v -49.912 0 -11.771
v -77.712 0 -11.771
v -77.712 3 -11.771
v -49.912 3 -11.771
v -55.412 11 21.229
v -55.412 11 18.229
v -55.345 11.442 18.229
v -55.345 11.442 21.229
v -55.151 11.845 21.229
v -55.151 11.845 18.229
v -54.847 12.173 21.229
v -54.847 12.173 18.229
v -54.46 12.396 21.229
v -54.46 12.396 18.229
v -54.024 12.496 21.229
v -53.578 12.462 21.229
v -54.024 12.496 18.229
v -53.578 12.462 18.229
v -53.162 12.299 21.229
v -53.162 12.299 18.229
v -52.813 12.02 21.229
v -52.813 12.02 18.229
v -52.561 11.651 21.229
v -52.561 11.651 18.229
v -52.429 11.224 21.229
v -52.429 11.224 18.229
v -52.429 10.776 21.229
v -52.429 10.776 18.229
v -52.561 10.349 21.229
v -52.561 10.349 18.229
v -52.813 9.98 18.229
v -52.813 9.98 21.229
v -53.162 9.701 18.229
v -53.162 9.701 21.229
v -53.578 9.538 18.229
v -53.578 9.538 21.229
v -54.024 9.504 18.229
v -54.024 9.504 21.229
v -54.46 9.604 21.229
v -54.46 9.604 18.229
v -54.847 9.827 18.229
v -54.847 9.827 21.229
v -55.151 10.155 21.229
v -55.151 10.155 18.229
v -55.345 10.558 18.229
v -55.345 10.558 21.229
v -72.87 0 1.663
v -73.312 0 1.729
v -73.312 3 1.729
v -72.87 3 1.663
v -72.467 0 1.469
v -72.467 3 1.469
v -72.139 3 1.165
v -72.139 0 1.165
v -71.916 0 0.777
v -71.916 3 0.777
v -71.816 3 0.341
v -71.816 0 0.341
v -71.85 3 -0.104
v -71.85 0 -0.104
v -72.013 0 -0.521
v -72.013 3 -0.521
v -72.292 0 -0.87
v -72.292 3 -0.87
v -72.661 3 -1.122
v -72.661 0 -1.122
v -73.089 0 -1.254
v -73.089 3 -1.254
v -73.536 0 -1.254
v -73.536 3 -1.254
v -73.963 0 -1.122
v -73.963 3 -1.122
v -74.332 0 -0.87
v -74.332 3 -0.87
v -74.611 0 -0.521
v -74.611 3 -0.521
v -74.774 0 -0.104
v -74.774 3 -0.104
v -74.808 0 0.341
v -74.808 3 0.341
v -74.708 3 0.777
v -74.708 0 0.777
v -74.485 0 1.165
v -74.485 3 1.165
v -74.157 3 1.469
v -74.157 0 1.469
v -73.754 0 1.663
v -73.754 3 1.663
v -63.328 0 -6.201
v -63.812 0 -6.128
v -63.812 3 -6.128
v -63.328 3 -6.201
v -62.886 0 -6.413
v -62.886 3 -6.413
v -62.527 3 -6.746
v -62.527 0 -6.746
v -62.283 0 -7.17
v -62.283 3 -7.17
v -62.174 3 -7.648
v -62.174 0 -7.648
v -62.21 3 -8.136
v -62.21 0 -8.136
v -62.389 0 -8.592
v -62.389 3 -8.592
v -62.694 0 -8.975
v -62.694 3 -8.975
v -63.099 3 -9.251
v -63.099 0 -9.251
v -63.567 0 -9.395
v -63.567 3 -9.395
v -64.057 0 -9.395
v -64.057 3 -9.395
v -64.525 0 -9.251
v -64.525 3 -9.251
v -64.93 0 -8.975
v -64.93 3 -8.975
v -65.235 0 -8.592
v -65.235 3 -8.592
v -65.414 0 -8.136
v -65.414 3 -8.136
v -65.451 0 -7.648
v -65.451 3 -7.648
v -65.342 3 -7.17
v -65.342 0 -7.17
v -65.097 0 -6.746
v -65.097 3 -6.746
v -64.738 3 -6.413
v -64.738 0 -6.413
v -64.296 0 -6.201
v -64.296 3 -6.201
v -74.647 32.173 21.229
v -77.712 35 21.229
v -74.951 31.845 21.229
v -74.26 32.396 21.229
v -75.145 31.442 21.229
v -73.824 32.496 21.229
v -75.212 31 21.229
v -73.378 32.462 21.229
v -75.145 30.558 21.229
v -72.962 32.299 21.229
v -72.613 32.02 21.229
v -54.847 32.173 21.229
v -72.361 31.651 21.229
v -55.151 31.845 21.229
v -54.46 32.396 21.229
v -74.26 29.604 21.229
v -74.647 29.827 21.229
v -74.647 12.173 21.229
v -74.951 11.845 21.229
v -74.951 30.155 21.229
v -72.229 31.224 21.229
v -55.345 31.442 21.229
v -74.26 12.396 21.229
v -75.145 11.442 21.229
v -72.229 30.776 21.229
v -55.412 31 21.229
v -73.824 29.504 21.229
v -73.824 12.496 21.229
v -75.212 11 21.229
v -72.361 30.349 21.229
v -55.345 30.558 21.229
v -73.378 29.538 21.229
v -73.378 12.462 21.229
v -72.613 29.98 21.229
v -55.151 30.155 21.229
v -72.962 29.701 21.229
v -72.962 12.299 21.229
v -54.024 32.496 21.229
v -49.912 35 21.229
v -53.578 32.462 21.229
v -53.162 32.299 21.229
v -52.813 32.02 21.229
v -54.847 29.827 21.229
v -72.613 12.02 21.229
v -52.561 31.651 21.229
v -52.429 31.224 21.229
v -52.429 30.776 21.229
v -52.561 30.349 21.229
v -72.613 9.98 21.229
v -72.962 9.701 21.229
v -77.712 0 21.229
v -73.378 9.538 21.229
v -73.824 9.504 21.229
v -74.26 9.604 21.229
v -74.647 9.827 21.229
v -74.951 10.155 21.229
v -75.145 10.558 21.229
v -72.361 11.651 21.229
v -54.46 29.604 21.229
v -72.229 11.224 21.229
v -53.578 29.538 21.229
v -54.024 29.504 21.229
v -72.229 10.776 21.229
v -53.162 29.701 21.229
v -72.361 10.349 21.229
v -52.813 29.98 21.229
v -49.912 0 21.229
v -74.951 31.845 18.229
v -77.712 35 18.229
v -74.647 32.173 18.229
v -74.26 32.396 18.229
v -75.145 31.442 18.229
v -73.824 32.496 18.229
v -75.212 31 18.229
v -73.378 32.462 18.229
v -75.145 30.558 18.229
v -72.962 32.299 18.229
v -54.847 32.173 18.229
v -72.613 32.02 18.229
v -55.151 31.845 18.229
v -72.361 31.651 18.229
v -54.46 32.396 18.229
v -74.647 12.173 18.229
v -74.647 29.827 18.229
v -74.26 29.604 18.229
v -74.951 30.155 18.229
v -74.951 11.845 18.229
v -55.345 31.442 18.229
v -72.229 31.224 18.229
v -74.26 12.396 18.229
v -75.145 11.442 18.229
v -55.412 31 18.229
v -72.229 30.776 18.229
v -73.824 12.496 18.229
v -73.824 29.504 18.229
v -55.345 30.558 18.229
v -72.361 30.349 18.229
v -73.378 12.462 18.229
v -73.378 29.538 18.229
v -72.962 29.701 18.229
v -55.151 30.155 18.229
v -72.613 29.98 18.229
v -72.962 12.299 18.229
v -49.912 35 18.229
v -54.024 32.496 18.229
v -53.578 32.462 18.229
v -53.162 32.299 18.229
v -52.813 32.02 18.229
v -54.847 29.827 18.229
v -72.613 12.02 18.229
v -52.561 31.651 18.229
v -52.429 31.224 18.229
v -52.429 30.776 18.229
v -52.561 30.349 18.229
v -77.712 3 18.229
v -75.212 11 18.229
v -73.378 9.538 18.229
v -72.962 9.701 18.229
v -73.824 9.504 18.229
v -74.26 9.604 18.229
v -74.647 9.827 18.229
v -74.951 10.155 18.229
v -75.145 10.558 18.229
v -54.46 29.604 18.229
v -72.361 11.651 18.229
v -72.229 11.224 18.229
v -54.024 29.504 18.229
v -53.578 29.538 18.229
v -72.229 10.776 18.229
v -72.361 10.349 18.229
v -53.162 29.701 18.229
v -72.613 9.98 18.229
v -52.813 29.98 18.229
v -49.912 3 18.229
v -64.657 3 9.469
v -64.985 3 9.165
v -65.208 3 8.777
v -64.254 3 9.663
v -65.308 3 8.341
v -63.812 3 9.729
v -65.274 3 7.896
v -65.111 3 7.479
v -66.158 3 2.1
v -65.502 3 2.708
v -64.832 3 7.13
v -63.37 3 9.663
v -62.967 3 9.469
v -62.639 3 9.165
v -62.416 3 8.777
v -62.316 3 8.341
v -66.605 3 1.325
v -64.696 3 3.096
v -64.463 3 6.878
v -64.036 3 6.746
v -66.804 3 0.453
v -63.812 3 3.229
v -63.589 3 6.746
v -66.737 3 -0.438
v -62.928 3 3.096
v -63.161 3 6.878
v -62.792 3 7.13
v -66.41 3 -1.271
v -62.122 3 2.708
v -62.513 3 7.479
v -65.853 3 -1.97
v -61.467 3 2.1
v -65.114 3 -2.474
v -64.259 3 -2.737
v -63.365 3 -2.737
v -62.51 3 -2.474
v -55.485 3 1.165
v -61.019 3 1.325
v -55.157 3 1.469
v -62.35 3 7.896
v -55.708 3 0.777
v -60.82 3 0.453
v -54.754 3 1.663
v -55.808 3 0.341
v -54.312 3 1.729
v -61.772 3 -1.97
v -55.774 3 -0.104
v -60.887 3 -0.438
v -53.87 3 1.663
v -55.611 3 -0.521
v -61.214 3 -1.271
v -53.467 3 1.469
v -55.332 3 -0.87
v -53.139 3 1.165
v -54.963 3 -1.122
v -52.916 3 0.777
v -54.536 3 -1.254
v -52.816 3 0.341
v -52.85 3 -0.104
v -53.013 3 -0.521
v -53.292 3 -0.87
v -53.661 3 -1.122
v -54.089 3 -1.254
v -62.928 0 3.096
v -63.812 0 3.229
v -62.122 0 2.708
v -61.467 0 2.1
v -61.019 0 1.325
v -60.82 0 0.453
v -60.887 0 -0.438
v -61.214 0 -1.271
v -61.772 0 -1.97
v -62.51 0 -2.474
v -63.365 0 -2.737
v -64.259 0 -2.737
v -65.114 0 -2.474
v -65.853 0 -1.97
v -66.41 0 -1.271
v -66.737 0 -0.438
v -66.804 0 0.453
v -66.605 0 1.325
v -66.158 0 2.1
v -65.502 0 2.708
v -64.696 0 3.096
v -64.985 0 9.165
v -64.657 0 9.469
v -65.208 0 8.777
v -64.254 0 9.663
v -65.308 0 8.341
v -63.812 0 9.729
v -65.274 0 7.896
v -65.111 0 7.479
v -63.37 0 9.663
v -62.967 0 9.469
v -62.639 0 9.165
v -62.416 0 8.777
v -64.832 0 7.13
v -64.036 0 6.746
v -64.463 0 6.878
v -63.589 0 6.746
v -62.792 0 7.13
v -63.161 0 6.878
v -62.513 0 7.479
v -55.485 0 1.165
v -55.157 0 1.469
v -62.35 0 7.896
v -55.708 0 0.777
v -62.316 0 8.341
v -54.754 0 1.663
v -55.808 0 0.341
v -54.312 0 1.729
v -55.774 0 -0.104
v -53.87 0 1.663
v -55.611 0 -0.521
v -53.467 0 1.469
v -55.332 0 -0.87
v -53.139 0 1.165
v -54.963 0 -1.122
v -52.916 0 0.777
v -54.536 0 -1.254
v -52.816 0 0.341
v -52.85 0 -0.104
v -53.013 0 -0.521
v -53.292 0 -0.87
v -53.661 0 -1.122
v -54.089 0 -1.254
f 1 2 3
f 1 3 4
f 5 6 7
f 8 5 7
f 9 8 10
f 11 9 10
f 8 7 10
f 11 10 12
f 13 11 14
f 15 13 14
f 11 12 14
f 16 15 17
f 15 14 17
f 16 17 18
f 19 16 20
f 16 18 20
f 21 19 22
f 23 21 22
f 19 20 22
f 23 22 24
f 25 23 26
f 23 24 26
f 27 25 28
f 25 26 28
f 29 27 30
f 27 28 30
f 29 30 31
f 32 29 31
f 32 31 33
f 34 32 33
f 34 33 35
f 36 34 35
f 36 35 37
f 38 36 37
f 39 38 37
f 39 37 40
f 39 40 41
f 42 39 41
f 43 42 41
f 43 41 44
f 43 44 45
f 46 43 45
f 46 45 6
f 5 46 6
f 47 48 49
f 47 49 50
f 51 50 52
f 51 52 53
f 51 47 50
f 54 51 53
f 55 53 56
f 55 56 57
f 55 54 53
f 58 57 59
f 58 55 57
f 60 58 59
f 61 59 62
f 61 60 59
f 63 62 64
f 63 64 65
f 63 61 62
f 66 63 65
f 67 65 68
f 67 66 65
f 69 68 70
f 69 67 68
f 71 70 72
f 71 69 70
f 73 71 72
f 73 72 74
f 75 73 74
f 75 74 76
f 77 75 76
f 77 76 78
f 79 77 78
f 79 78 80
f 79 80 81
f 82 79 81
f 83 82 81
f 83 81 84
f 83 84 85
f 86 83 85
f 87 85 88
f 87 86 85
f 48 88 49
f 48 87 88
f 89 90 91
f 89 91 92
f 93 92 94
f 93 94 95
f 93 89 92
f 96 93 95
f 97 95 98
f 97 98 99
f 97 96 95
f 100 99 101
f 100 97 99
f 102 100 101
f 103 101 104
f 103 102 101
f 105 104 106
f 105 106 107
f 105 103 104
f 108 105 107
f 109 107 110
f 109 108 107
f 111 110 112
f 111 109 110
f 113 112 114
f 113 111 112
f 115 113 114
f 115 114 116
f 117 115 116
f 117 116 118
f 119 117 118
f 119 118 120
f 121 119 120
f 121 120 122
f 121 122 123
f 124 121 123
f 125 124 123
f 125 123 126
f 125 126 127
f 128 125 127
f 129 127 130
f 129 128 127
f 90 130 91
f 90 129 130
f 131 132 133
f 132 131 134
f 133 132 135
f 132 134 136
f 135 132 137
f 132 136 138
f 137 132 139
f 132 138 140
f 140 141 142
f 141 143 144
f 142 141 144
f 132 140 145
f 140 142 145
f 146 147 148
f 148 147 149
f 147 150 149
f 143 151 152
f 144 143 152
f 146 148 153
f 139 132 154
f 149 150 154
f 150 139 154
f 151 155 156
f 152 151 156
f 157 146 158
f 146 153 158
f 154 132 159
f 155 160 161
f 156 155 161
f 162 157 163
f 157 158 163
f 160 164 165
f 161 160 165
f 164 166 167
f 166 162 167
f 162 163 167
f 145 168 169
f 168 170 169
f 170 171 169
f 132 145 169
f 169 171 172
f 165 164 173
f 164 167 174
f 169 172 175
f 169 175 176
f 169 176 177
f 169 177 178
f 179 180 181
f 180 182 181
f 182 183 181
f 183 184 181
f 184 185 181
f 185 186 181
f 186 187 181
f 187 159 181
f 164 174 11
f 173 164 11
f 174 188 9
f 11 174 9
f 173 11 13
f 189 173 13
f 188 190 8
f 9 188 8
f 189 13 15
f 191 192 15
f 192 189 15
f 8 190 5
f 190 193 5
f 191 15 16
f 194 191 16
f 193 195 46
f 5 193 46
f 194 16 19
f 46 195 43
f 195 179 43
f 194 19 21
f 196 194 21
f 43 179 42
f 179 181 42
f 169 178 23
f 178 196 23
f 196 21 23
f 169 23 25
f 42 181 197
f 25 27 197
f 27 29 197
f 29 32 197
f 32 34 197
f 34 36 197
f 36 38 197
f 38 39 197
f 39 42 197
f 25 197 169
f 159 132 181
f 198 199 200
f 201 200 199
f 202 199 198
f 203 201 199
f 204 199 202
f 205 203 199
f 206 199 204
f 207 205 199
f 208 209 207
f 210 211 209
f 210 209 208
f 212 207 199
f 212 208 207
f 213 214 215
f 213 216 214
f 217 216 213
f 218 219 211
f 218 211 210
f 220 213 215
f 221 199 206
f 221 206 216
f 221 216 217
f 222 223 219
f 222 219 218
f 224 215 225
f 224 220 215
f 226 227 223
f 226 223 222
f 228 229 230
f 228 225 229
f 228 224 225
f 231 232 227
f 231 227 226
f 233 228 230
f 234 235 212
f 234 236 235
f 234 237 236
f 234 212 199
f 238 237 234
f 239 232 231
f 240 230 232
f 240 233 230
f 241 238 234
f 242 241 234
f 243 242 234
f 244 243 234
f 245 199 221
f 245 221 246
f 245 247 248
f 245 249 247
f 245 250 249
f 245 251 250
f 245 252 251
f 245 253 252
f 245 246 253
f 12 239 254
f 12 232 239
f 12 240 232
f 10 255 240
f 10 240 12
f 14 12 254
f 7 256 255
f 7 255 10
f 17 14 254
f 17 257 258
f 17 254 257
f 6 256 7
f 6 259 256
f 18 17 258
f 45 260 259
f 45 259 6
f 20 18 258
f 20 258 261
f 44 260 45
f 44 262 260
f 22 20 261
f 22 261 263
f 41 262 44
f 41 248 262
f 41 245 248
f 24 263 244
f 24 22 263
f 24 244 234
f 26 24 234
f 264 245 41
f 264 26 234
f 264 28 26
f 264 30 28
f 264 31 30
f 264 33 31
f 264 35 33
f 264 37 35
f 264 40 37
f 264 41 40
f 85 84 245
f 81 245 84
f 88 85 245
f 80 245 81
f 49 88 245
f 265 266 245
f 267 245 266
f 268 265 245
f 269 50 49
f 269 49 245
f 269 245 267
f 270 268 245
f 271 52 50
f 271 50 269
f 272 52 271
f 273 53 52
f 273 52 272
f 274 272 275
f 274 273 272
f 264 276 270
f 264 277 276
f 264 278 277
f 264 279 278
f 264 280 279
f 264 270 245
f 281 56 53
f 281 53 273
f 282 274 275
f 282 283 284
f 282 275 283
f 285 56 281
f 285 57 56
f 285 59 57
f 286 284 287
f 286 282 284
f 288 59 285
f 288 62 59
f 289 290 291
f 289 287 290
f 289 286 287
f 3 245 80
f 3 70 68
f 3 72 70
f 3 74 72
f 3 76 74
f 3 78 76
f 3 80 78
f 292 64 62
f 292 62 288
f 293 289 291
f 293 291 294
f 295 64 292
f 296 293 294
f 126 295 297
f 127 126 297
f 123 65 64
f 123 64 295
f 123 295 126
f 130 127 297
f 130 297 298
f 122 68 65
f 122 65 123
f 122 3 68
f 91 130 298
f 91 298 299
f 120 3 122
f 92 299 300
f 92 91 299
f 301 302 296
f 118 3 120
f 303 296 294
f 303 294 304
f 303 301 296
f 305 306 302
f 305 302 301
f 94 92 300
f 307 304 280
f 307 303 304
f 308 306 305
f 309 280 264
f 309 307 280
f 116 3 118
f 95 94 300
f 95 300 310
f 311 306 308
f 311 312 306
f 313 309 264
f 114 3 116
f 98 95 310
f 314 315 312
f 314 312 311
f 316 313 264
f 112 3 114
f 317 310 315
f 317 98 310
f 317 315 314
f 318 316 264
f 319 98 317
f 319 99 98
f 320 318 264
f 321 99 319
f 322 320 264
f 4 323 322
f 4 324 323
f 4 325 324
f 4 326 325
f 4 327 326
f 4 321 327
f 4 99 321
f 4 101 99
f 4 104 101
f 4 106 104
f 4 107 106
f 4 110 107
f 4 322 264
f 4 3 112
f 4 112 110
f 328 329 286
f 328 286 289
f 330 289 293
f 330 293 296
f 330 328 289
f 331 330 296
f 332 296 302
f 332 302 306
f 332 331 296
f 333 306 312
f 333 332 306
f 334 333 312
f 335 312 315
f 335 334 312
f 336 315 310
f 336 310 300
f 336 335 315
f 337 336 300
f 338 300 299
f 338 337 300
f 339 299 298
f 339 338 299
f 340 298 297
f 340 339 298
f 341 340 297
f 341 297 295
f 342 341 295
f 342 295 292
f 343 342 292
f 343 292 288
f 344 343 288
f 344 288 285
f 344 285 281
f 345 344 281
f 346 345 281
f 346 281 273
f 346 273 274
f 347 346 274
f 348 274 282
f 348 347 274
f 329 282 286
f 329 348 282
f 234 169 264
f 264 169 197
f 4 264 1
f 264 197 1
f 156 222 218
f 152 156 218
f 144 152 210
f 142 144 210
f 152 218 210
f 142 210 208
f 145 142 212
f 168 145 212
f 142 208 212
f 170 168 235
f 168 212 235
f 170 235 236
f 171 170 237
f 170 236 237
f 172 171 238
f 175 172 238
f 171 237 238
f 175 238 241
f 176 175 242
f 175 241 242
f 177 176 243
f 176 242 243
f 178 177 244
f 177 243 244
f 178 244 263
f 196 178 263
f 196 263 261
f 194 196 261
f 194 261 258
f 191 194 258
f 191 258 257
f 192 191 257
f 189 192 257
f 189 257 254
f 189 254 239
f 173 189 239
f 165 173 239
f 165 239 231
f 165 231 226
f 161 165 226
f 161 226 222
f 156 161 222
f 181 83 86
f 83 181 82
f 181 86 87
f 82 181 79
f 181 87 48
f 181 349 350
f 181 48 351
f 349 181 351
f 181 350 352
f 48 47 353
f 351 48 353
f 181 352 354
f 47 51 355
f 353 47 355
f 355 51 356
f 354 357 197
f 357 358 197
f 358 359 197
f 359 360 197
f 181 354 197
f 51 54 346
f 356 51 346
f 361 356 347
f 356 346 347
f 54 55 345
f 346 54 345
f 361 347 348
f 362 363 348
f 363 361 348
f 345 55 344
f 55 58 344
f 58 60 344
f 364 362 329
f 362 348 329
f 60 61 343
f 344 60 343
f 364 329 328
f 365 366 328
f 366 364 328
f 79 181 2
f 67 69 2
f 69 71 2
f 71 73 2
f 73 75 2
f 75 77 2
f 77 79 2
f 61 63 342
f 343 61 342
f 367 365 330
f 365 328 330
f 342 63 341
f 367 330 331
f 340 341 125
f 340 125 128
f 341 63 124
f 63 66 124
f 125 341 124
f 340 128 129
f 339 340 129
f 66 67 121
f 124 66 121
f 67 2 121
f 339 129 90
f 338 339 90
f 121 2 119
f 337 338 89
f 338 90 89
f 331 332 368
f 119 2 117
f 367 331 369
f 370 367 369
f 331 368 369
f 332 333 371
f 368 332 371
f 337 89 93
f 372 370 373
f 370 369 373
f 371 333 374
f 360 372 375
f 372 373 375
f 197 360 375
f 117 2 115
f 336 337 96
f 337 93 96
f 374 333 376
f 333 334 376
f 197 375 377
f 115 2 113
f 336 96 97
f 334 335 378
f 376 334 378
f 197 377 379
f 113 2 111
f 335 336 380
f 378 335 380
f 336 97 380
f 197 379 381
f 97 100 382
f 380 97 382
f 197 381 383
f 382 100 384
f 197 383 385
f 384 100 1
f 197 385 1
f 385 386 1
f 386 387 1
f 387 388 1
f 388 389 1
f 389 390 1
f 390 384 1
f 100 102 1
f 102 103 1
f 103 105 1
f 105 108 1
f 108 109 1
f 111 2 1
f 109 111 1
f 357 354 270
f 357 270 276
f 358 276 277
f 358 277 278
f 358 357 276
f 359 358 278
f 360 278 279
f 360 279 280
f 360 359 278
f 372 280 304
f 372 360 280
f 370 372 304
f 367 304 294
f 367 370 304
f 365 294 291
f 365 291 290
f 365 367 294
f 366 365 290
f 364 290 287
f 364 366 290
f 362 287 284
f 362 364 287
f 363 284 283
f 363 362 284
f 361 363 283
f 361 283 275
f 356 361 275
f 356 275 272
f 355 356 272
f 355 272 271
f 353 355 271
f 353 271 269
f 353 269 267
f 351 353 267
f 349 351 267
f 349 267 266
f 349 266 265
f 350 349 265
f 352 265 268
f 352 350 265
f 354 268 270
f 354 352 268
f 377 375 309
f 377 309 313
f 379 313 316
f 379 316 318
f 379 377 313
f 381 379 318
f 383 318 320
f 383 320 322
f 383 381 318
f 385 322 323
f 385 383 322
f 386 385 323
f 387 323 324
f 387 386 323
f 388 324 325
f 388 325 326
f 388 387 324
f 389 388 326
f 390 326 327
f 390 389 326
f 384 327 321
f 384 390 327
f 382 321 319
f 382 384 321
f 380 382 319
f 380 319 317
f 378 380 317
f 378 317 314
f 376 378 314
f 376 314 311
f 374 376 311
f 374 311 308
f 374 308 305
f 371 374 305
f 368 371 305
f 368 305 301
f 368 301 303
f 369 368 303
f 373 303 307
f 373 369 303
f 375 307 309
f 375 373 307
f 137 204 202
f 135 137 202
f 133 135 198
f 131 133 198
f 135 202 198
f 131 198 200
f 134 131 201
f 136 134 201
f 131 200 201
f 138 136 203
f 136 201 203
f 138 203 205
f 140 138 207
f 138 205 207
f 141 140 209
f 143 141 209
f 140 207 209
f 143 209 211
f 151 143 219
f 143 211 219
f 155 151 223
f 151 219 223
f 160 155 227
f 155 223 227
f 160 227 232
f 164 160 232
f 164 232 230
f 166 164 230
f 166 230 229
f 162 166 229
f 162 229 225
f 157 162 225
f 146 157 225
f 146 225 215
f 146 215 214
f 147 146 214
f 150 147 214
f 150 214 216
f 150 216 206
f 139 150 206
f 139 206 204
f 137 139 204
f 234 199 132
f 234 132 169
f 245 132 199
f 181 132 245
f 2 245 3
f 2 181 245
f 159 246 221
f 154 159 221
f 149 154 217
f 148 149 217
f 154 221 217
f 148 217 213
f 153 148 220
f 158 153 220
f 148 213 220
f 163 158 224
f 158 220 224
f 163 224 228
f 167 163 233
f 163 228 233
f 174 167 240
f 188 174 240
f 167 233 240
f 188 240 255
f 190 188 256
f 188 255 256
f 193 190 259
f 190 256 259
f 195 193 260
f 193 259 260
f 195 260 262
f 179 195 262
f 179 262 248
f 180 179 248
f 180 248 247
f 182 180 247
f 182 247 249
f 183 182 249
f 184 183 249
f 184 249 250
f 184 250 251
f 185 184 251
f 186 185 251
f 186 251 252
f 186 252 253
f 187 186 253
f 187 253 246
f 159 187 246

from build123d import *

# Parameters (mm, degrees)
SKETCH1_W           = 27.8
SKETCH1_H           = 33
SKETCH1_R           = 1.643134295
SKETCH1_R_2         = 3
SKETCH1_R_3         = 1.5
BOSS_EXTRUDE2_DEPTH = 3
SKETCH2_W           = 27.8
SKETCH2_H           = 3
BOSS_EXTRUDE4_DEPTH = 32
SKETCH4_R           = 1.5
CUT_EXTRUDE2_DEPTH  = 32


with BuildPart() as part:
    # Sketch1 → Boss-Extrude2 (new body)
    with BuildSketch(Plane(origin=(0, 0, 0), x_dir=(1, 0, 0), z_dir=(0, 1, 0))):
        with Locations((-63.812097694, -4.729298211)):
            Rectangle(SKETCH1_W, SKETCH1_H)
        with Locations(Location((-63.812097694, 7.770701789, 0), (0, 0, 270))):
            Circle(SKETCH1_R, mode=Mode.SUBTRACT)
        with Locations(Location((-63.812097694, -0.229298211, 0), (0, 0, 270))):
            Circle(SKETCH1_R_2, mode=Mode.SUBTRACT)
        with Locations(Location((-63.812097694, -8.229298211, 0), (0, 0, 270))):
            Circle(SKETCH1_R_3, mode=Mode.SUBTRACT)
        with Locations(Location((-73.312097694, -0.229298211, 0), (0, 0, 270))):
            Circle(SKETCH1_R_3, mode=Mode.SUBTRACT)
        with Locations(Location((-54.312097694, -0.229298211, 0), (0, 0, 270))):
            Circle(SKETCH1_R_3, mode=Mode.SUBTRACT)
    extrude(amount=BOSS_EXTRUDE2_DEPTH)

    # Sketch2 → Boss-Extrude4 (add)
    with BuildSketch(Plane(origin=(0, 3, 0), x_dir=(1, 0, 0), z_dir=(0, 1, 0))):
        with Locations((-63.812097694, -19.729298211)):
            Rectangle(SKETCH2_W, SKETCH2_H)
    extrude(amount=BOSS_EXTRUDE4_DEPTH)

    # Sketch4 → Cut-Extrude2 (cut)
    with BuildSketch(Plane(origin=(0, 0, 18.229298211), x_dir=(-1, 0, 0), z_dir=(0, 0, -1))):
        with Locations((53.912097694, 11)):
            Circle(SKETCH4_R)
        with Locations((73.712097694, 31)):
            Circle(SKETCH4_R)
        with Locations((53.912097694, 31)):
            Circle(SKETCH4_R)
        with Locations((73.712097694, 11)):
            Circle(SKETCH4_R)
    extrude(amount=-CUT_EXTRUDE2_DEPTH, mode=Mode.SUBTRACT)


solid = part.part
